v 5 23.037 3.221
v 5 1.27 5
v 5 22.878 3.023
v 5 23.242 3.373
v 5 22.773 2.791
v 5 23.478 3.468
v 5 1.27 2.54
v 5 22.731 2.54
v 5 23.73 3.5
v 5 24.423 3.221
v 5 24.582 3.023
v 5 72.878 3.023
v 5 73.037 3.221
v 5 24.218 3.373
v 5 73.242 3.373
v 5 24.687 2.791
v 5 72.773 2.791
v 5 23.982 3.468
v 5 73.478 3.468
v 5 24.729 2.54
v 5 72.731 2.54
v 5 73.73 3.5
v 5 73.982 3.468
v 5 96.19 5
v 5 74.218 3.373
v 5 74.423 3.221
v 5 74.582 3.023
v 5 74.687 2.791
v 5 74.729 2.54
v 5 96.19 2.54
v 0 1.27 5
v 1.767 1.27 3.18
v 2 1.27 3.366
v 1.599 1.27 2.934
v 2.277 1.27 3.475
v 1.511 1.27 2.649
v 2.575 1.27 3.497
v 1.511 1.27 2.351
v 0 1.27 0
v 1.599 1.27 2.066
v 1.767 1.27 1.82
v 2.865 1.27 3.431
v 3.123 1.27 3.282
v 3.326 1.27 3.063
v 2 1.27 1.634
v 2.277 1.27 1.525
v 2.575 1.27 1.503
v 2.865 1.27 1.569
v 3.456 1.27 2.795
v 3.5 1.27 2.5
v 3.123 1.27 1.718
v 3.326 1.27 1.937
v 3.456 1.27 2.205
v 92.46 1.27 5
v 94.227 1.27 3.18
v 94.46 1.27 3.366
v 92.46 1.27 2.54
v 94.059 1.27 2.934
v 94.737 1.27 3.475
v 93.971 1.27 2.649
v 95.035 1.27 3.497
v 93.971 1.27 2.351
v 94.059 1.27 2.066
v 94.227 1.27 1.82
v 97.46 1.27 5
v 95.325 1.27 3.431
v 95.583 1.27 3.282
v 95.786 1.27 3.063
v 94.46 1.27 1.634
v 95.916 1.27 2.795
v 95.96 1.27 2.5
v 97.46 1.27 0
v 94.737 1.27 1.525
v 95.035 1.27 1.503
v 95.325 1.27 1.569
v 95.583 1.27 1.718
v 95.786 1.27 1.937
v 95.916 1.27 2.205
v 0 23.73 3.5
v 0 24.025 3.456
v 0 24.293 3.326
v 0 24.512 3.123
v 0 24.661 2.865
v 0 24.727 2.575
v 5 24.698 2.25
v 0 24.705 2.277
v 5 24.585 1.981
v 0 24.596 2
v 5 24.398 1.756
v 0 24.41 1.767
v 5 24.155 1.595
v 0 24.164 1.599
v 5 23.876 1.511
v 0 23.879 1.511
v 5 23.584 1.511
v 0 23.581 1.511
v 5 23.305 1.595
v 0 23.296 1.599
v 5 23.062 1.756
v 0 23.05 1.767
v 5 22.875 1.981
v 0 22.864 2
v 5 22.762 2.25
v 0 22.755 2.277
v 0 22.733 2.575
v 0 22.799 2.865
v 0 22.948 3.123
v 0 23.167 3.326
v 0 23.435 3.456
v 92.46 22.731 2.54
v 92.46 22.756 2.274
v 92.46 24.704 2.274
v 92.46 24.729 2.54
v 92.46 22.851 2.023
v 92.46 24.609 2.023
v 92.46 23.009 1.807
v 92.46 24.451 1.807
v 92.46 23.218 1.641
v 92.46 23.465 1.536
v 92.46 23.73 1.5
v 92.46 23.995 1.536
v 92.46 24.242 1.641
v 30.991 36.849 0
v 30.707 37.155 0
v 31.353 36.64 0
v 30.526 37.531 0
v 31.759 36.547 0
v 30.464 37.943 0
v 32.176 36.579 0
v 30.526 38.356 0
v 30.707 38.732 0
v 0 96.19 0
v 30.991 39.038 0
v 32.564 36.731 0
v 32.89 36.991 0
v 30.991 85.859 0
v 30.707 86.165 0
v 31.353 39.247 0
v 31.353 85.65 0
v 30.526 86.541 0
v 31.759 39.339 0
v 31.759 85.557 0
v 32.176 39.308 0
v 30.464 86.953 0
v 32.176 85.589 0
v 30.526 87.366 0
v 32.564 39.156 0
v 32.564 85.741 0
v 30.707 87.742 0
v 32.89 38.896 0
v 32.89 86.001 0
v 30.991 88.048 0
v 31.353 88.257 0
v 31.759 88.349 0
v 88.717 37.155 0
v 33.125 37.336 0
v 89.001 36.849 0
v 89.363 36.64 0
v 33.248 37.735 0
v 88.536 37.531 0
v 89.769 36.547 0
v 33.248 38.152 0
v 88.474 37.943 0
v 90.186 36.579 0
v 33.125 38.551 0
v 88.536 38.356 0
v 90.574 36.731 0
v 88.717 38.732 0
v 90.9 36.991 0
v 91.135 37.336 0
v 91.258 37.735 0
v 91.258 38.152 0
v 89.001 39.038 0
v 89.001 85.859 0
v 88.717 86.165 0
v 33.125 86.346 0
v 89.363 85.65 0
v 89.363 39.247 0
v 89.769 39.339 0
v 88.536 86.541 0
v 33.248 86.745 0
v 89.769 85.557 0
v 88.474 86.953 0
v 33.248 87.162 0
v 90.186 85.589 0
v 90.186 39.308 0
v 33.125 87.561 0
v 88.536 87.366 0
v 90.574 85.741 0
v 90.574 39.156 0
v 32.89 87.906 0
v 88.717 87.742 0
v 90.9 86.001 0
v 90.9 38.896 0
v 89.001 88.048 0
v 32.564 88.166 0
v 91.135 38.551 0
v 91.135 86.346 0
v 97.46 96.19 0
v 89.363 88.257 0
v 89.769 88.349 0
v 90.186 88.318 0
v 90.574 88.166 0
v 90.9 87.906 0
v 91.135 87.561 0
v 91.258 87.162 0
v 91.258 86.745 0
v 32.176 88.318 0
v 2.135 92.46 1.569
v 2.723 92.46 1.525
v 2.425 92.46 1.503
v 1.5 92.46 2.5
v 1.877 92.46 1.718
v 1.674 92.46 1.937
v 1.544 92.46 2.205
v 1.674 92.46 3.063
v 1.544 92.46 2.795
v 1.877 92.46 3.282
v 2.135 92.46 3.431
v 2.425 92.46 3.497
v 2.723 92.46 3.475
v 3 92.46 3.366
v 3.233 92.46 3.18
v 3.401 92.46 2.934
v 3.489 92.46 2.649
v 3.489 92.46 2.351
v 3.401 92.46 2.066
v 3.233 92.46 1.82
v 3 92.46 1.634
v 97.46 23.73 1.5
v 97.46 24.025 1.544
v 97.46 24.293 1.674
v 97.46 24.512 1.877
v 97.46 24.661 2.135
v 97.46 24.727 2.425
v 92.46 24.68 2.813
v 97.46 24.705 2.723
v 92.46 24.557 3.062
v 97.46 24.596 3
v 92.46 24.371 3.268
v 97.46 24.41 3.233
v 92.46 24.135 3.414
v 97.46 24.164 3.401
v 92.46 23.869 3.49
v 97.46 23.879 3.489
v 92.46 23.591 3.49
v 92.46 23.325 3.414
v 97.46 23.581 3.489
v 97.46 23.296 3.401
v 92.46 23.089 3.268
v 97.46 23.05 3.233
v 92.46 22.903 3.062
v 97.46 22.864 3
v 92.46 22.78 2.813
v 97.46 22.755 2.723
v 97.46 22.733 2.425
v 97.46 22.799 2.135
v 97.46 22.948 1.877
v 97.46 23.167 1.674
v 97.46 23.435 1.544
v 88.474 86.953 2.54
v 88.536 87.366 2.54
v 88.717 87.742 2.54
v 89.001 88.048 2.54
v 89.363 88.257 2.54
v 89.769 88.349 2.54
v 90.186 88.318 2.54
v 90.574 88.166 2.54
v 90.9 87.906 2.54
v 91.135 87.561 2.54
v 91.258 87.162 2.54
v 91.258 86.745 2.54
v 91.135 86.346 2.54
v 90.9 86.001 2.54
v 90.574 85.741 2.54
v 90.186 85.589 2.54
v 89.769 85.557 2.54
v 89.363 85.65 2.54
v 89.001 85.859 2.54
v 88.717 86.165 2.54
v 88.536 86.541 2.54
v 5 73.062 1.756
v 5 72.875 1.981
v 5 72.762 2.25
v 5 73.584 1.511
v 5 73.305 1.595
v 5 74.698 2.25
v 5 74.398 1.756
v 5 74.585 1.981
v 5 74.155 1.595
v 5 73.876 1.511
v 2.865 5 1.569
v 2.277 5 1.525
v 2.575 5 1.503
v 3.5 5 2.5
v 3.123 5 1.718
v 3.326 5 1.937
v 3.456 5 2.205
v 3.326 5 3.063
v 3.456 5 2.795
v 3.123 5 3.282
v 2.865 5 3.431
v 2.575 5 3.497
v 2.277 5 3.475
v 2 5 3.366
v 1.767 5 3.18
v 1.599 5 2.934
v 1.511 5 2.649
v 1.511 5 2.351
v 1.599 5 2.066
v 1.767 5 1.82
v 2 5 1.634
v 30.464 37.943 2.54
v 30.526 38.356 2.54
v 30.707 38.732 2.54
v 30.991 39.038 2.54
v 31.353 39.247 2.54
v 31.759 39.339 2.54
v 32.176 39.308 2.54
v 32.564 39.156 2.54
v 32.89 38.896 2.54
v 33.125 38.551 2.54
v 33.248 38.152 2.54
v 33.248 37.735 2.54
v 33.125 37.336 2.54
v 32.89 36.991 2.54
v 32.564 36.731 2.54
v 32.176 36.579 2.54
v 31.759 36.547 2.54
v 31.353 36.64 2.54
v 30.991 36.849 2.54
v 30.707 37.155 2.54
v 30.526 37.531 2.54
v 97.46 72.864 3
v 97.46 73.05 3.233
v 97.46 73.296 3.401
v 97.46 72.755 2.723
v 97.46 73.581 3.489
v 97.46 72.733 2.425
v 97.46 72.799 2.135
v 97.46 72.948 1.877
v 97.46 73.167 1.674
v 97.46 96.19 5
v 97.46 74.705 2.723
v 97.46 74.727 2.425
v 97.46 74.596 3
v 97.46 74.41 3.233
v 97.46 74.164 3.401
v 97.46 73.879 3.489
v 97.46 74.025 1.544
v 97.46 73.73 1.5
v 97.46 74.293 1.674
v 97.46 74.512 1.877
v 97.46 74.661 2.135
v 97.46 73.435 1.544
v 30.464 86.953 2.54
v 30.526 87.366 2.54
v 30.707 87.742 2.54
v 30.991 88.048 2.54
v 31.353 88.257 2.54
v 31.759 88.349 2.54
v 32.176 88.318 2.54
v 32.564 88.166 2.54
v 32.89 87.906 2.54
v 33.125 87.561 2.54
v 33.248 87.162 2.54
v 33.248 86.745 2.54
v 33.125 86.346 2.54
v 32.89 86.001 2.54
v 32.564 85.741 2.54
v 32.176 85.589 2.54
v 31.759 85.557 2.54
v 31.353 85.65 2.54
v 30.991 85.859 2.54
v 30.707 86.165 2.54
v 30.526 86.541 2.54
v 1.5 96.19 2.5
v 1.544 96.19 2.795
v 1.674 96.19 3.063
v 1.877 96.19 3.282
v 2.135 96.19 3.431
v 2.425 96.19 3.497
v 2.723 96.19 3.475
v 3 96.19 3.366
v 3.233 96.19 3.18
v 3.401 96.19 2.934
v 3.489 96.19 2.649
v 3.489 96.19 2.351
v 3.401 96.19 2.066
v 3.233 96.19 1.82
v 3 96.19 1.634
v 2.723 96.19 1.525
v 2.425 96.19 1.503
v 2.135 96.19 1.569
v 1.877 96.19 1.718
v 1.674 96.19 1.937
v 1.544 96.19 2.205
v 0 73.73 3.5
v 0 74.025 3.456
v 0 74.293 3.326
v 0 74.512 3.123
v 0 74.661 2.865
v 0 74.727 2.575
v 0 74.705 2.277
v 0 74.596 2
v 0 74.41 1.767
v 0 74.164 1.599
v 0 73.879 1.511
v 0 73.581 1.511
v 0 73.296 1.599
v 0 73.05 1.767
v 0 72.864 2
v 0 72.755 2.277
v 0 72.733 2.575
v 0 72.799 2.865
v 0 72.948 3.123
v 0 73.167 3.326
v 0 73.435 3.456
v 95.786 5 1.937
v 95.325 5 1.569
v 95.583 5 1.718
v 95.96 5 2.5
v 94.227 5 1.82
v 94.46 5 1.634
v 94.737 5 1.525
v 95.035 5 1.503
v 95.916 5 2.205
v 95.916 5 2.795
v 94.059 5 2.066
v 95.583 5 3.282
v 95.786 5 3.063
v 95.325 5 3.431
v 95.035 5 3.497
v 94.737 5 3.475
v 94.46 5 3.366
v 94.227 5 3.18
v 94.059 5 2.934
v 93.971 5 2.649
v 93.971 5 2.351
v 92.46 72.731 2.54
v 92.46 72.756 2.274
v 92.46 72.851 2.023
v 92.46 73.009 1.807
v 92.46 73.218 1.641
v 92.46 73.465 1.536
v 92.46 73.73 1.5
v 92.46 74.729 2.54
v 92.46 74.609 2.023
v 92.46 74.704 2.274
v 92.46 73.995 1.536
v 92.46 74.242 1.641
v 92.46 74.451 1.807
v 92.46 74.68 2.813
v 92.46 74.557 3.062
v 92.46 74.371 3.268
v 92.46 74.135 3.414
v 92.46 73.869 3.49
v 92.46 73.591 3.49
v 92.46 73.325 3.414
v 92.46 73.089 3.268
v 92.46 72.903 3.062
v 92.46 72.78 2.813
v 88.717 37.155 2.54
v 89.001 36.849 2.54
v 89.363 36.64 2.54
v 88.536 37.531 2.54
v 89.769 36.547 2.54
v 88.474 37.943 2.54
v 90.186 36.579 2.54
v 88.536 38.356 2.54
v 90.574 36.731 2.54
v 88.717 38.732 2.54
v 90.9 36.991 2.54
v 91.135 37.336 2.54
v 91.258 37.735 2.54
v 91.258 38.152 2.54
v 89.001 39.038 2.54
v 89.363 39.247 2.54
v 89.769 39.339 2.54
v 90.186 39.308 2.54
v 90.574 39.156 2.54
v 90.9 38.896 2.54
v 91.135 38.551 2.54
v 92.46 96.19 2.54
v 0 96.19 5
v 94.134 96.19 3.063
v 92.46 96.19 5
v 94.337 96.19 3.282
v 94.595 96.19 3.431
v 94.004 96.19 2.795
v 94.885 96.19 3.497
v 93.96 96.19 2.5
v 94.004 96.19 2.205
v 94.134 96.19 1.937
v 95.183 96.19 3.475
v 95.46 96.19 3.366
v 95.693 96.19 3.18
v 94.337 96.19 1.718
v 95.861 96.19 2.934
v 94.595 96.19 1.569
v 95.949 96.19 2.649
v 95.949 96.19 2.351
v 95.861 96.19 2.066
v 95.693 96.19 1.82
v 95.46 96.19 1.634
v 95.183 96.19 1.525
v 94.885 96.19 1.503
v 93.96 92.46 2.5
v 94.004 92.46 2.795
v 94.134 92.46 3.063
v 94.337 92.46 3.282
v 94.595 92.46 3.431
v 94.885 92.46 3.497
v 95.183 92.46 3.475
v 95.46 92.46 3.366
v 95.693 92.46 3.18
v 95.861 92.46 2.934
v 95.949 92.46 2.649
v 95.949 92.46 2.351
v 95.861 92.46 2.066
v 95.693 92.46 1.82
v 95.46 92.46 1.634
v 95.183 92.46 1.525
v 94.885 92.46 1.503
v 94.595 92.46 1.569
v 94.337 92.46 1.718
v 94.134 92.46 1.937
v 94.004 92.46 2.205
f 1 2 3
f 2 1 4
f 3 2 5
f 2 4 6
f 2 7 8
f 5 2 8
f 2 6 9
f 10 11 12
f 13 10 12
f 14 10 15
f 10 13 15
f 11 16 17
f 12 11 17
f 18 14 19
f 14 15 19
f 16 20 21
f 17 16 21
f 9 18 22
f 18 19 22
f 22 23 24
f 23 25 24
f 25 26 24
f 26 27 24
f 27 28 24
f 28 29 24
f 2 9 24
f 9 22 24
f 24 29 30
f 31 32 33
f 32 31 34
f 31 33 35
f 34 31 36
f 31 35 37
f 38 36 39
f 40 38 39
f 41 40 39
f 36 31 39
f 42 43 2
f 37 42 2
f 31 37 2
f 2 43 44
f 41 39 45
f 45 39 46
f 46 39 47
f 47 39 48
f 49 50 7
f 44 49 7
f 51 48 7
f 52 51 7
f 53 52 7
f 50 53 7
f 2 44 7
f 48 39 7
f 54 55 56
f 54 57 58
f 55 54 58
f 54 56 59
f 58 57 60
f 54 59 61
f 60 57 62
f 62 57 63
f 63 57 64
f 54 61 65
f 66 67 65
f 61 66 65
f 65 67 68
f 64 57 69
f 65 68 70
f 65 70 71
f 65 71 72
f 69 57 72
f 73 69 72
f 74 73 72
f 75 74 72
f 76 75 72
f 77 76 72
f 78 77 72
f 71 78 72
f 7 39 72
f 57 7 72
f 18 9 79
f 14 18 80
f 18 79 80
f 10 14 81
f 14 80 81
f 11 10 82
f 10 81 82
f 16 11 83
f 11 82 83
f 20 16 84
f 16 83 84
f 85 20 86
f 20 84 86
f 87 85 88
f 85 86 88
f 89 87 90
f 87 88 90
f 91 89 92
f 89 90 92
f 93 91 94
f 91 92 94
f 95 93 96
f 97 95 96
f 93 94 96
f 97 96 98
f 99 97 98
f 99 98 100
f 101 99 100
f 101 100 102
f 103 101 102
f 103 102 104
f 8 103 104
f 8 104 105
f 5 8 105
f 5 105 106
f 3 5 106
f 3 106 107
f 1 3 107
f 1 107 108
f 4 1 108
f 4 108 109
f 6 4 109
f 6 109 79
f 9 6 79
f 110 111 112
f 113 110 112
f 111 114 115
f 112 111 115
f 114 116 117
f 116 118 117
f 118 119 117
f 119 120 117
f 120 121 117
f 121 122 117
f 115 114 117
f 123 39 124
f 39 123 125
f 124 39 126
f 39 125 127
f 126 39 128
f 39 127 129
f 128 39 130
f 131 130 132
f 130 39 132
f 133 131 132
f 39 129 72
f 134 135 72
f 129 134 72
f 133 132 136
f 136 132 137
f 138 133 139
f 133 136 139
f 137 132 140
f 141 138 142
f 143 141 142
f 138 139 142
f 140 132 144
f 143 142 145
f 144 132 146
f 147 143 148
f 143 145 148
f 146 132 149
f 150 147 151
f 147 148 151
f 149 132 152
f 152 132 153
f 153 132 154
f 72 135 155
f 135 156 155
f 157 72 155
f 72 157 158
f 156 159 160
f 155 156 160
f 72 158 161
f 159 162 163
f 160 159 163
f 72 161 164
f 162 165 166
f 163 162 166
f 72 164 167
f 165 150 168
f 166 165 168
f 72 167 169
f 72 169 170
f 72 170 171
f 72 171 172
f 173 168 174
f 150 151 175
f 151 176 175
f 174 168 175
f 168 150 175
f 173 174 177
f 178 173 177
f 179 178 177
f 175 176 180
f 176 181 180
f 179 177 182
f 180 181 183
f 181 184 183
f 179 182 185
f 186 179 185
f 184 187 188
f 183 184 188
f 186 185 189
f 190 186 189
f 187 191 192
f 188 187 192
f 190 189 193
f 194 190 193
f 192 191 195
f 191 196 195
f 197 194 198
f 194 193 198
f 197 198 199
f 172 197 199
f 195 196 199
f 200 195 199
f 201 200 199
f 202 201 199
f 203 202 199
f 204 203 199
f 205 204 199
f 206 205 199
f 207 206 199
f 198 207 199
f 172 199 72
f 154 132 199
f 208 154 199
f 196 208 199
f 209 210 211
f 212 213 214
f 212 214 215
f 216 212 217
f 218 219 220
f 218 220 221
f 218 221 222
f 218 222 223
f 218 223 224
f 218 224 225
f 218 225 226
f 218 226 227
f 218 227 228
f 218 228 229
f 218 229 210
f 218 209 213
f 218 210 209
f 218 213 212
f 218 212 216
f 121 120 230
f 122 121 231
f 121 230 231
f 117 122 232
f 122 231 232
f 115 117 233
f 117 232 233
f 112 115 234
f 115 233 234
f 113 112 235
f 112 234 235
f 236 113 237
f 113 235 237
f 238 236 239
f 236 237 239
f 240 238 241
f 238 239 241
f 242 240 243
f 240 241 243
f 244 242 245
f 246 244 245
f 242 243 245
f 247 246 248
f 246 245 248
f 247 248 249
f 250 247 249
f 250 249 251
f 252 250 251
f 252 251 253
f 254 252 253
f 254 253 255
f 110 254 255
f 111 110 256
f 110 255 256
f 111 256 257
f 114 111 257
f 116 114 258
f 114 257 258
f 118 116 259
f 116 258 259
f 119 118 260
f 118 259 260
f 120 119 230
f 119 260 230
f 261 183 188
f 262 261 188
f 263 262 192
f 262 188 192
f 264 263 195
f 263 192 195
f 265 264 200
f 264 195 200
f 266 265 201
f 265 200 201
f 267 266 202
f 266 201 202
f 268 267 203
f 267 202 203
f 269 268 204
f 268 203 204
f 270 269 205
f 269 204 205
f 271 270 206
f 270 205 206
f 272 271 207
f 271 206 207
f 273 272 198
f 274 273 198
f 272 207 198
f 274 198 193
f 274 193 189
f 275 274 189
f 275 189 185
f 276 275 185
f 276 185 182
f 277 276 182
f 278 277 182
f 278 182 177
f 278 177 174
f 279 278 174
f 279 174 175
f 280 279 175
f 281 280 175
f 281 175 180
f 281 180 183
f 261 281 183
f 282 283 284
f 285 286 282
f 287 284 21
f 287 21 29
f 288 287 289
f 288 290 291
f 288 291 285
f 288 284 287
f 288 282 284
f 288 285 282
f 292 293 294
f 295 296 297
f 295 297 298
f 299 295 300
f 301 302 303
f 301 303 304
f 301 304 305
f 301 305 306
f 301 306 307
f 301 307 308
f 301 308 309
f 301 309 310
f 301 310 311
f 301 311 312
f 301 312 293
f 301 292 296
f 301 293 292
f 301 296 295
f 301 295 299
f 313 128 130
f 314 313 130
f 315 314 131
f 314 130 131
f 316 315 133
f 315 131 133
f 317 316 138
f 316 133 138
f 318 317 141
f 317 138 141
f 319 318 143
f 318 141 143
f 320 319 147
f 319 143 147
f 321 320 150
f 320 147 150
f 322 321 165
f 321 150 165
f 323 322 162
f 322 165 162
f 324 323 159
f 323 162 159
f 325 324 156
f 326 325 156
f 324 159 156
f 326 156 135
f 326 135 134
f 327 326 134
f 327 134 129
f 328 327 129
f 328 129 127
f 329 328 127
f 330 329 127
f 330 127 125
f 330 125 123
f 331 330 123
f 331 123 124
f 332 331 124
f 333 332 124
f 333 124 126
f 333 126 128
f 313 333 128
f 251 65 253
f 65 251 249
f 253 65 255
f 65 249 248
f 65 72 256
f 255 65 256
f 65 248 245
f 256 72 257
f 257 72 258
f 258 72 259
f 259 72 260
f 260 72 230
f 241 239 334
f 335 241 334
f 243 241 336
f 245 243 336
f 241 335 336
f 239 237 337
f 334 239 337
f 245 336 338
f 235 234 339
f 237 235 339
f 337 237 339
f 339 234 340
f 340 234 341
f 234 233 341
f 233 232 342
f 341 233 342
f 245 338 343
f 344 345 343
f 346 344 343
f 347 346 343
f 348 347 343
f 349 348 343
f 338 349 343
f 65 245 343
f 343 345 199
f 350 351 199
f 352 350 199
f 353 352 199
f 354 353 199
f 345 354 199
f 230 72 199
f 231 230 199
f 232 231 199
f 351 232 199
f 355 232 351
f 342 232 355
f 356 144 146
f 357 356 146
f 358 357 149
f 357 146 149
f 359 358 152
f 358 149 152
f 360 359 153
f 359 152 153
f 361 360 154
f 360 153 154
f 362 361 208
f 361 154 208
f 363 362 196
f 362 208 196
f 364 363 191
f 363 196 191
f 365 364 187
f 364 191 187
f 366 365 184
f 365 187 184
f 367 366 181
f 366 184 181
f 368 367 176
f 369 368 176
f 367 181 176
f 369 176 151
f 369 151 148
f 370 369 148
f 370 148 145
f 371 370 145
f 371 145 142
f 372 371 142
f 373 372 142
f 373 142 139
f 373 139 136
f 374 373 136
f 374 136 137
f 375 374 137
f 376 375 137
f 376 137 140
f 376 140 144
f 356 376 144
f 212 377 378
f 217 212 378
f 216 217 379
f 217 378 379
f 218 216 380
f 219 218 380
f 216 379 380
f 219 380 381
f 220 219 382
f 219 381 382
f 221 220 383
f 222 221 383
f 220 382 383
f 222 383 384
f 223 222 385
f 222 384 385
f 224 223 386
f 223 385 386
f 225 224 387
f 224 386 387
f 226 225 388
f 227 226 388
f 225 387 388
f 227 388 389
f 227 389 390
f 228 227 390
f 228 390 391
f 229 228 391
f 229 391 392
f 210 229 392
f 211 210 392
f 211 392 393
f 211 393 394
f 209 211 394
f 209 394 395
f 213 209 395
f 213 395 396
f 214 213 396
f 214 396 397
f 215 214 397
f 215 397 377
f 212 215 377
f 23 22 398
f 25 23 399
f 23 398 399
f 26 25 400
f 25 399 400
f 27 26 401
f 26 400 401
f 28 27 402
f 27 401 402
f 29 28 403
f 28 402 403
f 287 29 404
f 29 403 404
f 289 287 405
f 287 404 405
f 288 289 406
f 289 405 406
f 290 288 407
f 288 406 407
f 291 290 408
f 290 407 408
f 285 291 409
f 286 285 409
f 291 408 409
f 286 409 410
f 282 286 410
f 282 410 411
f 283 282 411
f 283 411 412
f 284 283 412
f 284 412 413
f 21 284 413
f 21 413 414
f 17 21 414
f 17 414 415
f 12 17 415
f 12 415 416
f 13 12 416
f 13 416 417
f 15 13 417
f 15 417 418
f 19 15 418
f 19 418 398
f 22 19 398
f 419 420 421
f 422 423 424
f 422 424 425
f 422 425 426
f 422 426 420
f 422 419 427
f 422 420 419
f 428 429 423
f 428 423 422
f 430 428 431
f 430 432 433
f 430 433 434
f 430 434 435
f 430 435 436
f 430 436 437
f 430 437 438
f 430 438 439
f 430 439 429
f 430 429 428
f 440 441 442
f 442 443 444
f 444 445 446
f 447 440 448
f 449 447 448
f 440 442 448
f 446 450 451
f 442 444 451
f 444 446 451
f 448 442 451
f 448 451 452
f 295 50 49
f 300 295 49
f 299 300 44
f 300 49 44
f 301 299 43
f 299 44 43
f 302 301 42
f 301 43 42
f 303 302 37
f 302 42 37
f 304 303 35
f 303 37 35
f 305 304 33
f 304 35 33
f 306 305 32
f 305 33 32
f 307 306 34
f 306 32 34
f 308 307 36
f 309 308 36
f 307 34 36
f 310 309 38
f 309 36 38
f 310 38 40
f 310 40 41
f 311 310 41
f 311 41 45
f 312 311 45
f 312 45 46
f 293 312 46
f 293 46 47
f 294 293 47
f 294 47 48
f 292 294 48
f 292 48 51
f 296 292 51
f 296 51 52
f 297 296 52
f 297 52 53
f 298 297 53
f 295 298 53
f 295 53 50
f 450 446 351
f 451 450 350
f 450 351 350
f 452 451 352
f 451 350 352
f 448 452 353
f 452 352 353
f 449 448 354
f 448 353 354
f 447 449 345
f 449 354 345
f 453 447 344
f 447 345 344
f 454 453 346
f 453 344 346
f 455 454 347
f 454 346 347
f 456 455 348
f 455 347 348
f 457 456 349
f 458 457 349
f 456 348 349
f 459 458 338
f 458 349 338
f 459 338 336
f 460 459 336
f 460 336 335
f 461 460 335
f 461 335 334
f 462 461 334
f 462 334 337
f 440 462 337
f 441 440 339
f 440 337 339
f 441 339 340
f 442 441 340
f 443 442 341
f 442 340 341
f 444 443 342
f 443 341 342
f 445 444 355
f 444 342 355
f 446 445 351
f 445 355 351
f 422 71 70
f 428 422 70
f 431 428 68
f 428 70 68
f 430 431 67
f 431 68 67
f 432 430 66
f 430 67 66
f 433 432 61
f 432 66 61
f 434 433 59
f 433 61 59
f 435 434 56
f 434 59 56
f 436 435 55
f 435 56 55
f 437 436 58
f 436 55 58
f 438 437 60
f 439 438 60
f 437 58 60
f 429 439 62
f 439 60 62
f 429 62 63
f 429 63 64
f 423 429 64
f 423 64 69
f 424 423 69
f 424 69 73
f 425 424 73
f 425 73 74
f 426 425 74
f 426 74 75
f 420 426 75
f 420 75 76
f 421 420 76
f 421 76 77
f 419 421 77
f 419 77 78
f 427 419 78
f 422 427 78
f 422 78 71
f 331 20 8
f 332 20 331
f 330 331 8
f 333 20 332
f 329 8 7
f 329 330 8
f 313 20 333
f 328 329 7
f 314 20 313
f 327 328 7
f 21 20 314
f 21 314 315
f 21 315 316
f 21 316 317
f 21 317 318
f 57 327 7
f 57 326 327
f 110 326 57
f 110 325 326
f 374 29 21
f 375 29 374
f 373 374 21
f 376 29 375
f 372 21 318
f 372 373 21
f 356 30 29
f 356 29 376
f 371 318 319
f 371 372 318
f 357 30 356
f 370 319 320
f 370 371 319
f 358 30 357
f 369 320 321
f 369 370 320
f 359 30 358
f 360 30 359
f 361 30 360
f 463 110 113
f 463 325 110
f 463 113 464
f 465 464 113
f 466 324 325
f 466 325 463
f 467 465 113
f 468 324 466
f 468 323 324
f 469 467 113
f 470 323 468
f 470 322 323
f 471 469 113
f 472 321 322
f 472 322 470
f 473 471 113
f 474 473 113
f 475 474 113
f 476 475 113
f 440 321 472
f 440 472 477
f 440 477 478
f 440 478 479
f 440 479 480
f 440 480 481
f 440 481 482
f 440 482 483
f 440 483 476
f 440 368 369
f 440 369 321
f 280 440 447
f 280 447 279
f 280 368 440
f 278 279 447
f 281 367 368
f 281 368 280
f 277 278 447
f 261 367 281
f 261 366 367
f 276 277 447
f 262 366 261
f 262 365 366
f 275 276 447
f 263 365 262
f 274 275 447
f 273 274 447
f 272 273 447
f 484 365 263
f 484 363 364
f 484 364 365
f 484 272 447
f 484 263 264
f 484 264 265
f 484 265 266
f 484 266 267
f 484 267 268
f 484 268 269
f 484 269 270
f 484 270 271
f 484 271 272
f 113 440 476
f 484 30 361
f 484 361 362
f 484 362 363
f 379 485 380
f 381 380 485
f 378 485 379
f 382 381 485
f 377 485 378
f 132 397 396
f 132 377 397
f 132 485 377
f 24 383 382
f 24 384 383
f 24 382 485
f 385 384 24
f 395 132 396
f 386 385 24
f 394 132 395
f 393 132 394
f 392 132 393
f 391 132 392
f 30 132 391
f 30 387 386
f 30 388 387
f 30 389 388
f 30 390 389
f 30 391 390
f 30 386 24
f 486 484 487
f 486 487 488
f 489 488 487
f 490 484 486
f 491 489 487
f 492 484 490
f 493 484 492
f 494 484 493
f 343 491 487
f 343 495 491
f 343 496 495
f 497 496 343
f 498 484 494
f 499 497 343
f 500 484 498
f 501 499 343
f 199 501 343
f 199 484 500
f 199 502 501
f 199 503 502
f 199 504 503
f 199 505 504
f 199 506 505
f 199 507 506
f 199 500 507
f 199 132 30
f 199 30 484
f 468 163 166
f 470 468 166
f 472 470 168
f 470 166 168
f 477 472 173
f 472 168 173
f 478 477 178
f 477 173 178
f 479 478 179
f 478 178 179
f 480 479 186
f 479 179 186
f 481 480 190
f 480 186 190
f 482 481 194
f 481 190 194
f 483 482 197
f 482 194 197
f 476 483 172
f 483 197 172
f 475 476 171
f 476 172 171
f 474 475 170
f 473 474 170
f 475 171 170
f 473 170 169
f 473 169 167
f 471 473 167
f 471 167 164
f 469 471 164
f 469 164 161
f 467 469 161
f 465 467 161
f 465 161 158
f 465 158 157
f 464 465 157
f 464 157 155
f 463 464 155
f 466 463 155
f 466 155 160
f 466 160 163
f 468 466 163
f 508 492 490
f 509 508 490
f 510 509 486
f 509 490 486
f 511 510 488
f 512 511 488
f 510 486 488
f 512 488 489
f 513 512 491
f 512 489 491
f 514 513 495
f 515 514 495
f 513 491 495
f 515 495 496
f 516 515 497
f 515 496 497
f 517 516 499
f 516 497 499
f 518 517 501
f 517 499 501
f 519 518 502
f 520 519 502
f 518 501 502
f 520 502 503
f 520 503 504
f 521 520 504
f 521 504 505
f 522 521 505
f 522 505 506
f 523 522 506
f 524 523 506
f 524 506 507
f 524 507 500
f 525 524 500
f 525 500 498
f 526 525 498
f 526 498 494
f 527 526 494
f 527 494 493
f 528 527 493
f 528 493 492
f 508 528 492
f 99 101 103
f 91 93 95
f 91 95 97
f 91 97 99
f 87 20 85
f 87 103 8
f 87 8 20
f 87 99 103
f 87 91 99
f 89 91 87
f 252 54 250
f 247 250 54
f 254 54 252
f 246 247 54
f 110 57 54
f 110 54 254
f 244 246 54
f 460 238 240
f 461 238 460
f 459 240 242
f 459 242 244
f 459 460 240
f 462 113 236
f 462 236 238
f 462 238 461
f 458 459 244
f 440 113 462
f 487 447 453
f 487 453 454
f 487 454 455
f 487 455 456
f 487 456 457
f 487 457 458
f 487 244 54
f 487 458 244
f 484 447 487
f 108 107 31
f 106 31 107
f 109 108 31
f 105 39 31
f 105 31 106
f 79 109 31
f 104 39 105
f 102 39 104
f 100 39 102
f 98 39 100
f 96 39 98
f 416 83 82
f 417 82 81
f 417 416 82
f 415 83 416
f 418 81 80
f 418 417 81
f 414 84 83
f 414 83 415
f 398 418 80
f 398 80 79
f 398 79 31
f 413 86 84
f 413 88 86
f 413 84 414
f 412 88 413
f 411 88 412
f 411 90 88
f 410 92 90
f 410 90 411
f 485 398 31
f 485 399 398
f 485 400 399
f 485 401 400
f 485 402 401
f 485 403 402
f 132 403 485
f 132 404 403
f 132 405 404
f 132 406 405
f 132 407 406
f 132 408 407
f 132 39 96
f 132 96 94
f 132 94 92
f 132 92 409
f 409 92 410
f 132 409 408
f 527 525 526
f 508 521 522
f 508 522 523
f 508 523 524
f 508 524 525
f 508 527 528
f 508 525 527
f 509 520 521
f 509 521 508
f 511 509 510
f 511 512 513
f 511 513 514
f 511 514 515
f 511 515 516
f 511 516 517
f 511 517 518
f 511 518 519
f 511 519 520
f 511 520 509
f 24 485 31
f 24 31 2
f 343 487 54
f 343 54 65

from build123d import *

# Parameters (mm, degrees)
SKETCH1_W           = 97.46
SKETCH1_H           = 97.46
BOSS_EXTRUDE1_DEPTH = 1.27
SKETCH3_W           = 5
SKETCH3_H           = 97.46
BOSS_EXTRUDE2_DEPTH = 3.73
SKETCH7_R           = 1
CUT_EXTRUDE2_DEPTH  = 5
SKETCH6_R           = 1
CUT_EXTRUDE3_DEPTH  = 5
SKETCH4_R           = 1
CUT_EXTRUDE4_DEPTH  = 5
SKETCH5_R           = 1
CUT_EXTRUDE5_DEPTH  = 5
CUT_EXTRUDE7_REACH  = 99.46
SKETCH10_R          = 1
CUT_EXTRUDE8_REACH  = 99.46
SKETCH9_R           = 1
CUT_EXTRUDE9_DEPTH  = 1.27
CUT_EXTRUDE10_DEPTH = 1.27
SKETCH13_W          = 87.46
SKETCH13_H          = 94.92
BOSS_EXTRUDE3_DEPTH = 1.27
SKETCH8_R           = 1.4
CUT_EXTRUDE6_DEPTH  = 10


with BuildPart() as part:
    # Sketch1 → Boss-Extrude1 (new body)
    with BuildSketch(Plane.XY):
        with Locations((48.73, 48.73)):
            Rectangle(SKETCH1_W, SKETCH1_H)
    extrude(amount=BOSS_EXTRUDE1_DEPTH)

    # Sketch3 → Boss-Extrude2 (add)
    with BuildSketch(Plane.XY.offset(1.27)):
        with Locations((2.5, 48.73)):
            Rectangle(SKETCH3_W, SKETCH3_H)
        with Locations((94.96, 48.73)):
            Rectangle(SKETCH3_W, SKETCH3_H)
    extrude(amount=BOSS_EXTRUDE2_DEPTH)

    # Sketch7 → Cut-Extrude2 (cut)
    with BuildSketch(Plane(origin=(0, 97.46, 0), x_dir=(-1, 0, 0), z_dir=(0, 1, 0))):
        with Locations((-2.5, 2.5)):
            Circle(SKETCH7_R)
    extrude(amount=-CUT_EXTRUDE2_DEPTH, mode=Mode.SUBTRACT)

    # Sketch6 → Cut-Extrude3 (cut)
    with BuildSketch(Plane(origin=(0, 97.46, 0), x_dir=(-1, 0, 0), z_dir=(0, 1, 0))):
        with Locations((-94.96, 2.5)):
            Circle(SKETCH6_R)
    extrude(amount=-CUT_EXTRUDE3_DEPTH, mode=Mode.SUBTRACT)

    # Sketch4 → Cut-Extrude4 (cut)
    with BuildSketch(Plane.XZ):
        with Locations((94.96, 2.5)):
            Circle(SKETCH4_R)
    extrude(amount=-CUT_EXTRUDE4_DEPTH, mode=Mode.SUBTRACT)

    # Sketch5 → Cut-Extrude5 (cut)
    with BuildSketch(Plane.XZ):
        with Locations((2.5, 2.5)):
            Circle(SKETCH5_R)
    extrude(amount=-CUT_EXTRUDE5_DEPTH, mode=Mode.SUBTRACT)

    # Sketch10 → Cut-Extrude7 (cut, up to next)
    with BuildSketch(Plane.ZY, mode=Mode.PRIVATE) as cut_extrude7_sk1:
        with Locations((2.5, 23.73)):
            Circle(SKETCH10_R)
    cut_extrude7_tool1 = extrude(cut_extrude7_sk1.sketch, amount=-CUT_EXTRUDE7_REACH, mode=Mode.PRIVATE) & part.part
    add(cut_extrude7_tool1.solids().sort_by_distance((0, 23.73, 2.5))[0], mode=Mode.SUBTRACT)
    # Sketch10 → Cut-Extrude7 (cut, up to next)
    with BuildSketch(Plane.ZY, mode=Mode.PRIVATE) as cut_extrude7_sk2:
        with Locations((2.5, 73.73)):
            Circle(SKETCH10_R)
    cut_extrude7_tool2 = extrude(cut_extrude7_sk2.sketch, amount=-CUT_EXTRUDE7_REACH, mode=Mode.PRIVATE) & part.part
    add(cut_extrude7_tool2.solids().sort_by_distance((0, 73.73, 2.5))[0], mode=Mode.SUBTRACT)

    # Sketch9 → Cut-Extrude8 (cut, up to next)
    with BuildSketch(Plane(origin=(97.46, 0, 0), x_dir=(0, 0, -1), z_dir=(1, 0, 0)), mode=Mode.PRIVATE) as cut_extrude8_sk1:
        with Locations((-2.5, 73.73)):
            Circle(SKETCH9_R)
    cut_extrude8_tool1 = extrude(cut_extrude8_sk1.sketch, amount=-CUT_EXTRUDE8_REACH, mode=Mode.PRIVATE) & part.part
    add(cut_extrude8_tool1.solids().sort_by_distance((97.46, 73.73, 2.5))[0], mode=Mode.SUBTRACT)
    # Sketch9 → Cut-Extrude8 (cut, up to next)
    with BuildSketch(Plane(origin=(97.46, 0, 0), x_dir=(0, 0, -1), z_dir=(1, 0, 0)), mode=Mode.PRIVATE) as cut_extrude8_sk2:
        with Locations((-2.5, 23.73)):
            Circle(SKETCH9_R)
    cut_extrude8_tool2 = extrude(cut_extrude8_sk2.sketch, amount=-CUT_EXTRUDE8_REACH, mode=Mode.PRIVATE) & part.part
    add(cut_extrude8_tool2.solids().sort_by_distance((97.46, 23.73, 2.5))[0], mode=Mode.SUBTRACT)

    # Sketch11 → Cut-Extrude9 (cut)
    with BuildSketch(Plane(origin=(0, 0, 0), x_dir=(-1, 0, 0), z_dir=(0, -1, 0))):
        Polygon((-92.46, -5), (-97.46, -5), (-97.46, 0), (0, 0), (0, -5), (-5, -5), (-5, -1.27), (-92.46, -1.27), align=None)
    extrude(amount=-CUT_EXTRUDE9_DEPTH, mode=Mode.SUBTRACT)

    # Sketch12 → Cut-Extrude10 (cut)
    with BuildSketch(Plane(origin=(0, 97.46, 0), x_dir=(1, 0, 0), z_dir=(0, 1, 0))):
        Polygon((92.46, -1.27), (92.46, -5), (97.46, -5), (97.46, 0), (0, 0), (0, -5), (5, -5), (5, -1.27), align=None)
    extrude(amount=-CUT_EXTRUDE10_DEPTH, mode=Mode.SUBTRACT)

    # Sketch13 → Boss-Extrude3 (add)
    with BuildSketch(Plane.XY.offset(1.27)):
        with Locations((48.73, 48.73)):
            Rectangle(SKETCH13_W, SKETCH13_H)
    extrude(amount=BOSS_EXTRUDE3_DEPTH)

    # Sketch8 → Cut-Extrude6 (cut)
    with BuildSketch(Plane(origin=(0, 0, 0), x_dir=(-1, 0, 0), z_dir=(0, 0, -1))):
        with Locations((-31.864061653, 37.943406611)):
            Circle(SKETCH8_R)
        with Locations((-89.874061653, 86.953406611)):
            Circle(SKETCH8_R)
        with Locations((-31.864061653, 86.953406611)):
            Circle(SKETCH8_R)
        with Locations((-89.874061653, 37.943406611)):
            Circle(SKETCH8_R)
    extrude(amount=-CUT_EXTRUDE6_DEPTH, mode=Mode.SUBTRACT)


solid = part.part
